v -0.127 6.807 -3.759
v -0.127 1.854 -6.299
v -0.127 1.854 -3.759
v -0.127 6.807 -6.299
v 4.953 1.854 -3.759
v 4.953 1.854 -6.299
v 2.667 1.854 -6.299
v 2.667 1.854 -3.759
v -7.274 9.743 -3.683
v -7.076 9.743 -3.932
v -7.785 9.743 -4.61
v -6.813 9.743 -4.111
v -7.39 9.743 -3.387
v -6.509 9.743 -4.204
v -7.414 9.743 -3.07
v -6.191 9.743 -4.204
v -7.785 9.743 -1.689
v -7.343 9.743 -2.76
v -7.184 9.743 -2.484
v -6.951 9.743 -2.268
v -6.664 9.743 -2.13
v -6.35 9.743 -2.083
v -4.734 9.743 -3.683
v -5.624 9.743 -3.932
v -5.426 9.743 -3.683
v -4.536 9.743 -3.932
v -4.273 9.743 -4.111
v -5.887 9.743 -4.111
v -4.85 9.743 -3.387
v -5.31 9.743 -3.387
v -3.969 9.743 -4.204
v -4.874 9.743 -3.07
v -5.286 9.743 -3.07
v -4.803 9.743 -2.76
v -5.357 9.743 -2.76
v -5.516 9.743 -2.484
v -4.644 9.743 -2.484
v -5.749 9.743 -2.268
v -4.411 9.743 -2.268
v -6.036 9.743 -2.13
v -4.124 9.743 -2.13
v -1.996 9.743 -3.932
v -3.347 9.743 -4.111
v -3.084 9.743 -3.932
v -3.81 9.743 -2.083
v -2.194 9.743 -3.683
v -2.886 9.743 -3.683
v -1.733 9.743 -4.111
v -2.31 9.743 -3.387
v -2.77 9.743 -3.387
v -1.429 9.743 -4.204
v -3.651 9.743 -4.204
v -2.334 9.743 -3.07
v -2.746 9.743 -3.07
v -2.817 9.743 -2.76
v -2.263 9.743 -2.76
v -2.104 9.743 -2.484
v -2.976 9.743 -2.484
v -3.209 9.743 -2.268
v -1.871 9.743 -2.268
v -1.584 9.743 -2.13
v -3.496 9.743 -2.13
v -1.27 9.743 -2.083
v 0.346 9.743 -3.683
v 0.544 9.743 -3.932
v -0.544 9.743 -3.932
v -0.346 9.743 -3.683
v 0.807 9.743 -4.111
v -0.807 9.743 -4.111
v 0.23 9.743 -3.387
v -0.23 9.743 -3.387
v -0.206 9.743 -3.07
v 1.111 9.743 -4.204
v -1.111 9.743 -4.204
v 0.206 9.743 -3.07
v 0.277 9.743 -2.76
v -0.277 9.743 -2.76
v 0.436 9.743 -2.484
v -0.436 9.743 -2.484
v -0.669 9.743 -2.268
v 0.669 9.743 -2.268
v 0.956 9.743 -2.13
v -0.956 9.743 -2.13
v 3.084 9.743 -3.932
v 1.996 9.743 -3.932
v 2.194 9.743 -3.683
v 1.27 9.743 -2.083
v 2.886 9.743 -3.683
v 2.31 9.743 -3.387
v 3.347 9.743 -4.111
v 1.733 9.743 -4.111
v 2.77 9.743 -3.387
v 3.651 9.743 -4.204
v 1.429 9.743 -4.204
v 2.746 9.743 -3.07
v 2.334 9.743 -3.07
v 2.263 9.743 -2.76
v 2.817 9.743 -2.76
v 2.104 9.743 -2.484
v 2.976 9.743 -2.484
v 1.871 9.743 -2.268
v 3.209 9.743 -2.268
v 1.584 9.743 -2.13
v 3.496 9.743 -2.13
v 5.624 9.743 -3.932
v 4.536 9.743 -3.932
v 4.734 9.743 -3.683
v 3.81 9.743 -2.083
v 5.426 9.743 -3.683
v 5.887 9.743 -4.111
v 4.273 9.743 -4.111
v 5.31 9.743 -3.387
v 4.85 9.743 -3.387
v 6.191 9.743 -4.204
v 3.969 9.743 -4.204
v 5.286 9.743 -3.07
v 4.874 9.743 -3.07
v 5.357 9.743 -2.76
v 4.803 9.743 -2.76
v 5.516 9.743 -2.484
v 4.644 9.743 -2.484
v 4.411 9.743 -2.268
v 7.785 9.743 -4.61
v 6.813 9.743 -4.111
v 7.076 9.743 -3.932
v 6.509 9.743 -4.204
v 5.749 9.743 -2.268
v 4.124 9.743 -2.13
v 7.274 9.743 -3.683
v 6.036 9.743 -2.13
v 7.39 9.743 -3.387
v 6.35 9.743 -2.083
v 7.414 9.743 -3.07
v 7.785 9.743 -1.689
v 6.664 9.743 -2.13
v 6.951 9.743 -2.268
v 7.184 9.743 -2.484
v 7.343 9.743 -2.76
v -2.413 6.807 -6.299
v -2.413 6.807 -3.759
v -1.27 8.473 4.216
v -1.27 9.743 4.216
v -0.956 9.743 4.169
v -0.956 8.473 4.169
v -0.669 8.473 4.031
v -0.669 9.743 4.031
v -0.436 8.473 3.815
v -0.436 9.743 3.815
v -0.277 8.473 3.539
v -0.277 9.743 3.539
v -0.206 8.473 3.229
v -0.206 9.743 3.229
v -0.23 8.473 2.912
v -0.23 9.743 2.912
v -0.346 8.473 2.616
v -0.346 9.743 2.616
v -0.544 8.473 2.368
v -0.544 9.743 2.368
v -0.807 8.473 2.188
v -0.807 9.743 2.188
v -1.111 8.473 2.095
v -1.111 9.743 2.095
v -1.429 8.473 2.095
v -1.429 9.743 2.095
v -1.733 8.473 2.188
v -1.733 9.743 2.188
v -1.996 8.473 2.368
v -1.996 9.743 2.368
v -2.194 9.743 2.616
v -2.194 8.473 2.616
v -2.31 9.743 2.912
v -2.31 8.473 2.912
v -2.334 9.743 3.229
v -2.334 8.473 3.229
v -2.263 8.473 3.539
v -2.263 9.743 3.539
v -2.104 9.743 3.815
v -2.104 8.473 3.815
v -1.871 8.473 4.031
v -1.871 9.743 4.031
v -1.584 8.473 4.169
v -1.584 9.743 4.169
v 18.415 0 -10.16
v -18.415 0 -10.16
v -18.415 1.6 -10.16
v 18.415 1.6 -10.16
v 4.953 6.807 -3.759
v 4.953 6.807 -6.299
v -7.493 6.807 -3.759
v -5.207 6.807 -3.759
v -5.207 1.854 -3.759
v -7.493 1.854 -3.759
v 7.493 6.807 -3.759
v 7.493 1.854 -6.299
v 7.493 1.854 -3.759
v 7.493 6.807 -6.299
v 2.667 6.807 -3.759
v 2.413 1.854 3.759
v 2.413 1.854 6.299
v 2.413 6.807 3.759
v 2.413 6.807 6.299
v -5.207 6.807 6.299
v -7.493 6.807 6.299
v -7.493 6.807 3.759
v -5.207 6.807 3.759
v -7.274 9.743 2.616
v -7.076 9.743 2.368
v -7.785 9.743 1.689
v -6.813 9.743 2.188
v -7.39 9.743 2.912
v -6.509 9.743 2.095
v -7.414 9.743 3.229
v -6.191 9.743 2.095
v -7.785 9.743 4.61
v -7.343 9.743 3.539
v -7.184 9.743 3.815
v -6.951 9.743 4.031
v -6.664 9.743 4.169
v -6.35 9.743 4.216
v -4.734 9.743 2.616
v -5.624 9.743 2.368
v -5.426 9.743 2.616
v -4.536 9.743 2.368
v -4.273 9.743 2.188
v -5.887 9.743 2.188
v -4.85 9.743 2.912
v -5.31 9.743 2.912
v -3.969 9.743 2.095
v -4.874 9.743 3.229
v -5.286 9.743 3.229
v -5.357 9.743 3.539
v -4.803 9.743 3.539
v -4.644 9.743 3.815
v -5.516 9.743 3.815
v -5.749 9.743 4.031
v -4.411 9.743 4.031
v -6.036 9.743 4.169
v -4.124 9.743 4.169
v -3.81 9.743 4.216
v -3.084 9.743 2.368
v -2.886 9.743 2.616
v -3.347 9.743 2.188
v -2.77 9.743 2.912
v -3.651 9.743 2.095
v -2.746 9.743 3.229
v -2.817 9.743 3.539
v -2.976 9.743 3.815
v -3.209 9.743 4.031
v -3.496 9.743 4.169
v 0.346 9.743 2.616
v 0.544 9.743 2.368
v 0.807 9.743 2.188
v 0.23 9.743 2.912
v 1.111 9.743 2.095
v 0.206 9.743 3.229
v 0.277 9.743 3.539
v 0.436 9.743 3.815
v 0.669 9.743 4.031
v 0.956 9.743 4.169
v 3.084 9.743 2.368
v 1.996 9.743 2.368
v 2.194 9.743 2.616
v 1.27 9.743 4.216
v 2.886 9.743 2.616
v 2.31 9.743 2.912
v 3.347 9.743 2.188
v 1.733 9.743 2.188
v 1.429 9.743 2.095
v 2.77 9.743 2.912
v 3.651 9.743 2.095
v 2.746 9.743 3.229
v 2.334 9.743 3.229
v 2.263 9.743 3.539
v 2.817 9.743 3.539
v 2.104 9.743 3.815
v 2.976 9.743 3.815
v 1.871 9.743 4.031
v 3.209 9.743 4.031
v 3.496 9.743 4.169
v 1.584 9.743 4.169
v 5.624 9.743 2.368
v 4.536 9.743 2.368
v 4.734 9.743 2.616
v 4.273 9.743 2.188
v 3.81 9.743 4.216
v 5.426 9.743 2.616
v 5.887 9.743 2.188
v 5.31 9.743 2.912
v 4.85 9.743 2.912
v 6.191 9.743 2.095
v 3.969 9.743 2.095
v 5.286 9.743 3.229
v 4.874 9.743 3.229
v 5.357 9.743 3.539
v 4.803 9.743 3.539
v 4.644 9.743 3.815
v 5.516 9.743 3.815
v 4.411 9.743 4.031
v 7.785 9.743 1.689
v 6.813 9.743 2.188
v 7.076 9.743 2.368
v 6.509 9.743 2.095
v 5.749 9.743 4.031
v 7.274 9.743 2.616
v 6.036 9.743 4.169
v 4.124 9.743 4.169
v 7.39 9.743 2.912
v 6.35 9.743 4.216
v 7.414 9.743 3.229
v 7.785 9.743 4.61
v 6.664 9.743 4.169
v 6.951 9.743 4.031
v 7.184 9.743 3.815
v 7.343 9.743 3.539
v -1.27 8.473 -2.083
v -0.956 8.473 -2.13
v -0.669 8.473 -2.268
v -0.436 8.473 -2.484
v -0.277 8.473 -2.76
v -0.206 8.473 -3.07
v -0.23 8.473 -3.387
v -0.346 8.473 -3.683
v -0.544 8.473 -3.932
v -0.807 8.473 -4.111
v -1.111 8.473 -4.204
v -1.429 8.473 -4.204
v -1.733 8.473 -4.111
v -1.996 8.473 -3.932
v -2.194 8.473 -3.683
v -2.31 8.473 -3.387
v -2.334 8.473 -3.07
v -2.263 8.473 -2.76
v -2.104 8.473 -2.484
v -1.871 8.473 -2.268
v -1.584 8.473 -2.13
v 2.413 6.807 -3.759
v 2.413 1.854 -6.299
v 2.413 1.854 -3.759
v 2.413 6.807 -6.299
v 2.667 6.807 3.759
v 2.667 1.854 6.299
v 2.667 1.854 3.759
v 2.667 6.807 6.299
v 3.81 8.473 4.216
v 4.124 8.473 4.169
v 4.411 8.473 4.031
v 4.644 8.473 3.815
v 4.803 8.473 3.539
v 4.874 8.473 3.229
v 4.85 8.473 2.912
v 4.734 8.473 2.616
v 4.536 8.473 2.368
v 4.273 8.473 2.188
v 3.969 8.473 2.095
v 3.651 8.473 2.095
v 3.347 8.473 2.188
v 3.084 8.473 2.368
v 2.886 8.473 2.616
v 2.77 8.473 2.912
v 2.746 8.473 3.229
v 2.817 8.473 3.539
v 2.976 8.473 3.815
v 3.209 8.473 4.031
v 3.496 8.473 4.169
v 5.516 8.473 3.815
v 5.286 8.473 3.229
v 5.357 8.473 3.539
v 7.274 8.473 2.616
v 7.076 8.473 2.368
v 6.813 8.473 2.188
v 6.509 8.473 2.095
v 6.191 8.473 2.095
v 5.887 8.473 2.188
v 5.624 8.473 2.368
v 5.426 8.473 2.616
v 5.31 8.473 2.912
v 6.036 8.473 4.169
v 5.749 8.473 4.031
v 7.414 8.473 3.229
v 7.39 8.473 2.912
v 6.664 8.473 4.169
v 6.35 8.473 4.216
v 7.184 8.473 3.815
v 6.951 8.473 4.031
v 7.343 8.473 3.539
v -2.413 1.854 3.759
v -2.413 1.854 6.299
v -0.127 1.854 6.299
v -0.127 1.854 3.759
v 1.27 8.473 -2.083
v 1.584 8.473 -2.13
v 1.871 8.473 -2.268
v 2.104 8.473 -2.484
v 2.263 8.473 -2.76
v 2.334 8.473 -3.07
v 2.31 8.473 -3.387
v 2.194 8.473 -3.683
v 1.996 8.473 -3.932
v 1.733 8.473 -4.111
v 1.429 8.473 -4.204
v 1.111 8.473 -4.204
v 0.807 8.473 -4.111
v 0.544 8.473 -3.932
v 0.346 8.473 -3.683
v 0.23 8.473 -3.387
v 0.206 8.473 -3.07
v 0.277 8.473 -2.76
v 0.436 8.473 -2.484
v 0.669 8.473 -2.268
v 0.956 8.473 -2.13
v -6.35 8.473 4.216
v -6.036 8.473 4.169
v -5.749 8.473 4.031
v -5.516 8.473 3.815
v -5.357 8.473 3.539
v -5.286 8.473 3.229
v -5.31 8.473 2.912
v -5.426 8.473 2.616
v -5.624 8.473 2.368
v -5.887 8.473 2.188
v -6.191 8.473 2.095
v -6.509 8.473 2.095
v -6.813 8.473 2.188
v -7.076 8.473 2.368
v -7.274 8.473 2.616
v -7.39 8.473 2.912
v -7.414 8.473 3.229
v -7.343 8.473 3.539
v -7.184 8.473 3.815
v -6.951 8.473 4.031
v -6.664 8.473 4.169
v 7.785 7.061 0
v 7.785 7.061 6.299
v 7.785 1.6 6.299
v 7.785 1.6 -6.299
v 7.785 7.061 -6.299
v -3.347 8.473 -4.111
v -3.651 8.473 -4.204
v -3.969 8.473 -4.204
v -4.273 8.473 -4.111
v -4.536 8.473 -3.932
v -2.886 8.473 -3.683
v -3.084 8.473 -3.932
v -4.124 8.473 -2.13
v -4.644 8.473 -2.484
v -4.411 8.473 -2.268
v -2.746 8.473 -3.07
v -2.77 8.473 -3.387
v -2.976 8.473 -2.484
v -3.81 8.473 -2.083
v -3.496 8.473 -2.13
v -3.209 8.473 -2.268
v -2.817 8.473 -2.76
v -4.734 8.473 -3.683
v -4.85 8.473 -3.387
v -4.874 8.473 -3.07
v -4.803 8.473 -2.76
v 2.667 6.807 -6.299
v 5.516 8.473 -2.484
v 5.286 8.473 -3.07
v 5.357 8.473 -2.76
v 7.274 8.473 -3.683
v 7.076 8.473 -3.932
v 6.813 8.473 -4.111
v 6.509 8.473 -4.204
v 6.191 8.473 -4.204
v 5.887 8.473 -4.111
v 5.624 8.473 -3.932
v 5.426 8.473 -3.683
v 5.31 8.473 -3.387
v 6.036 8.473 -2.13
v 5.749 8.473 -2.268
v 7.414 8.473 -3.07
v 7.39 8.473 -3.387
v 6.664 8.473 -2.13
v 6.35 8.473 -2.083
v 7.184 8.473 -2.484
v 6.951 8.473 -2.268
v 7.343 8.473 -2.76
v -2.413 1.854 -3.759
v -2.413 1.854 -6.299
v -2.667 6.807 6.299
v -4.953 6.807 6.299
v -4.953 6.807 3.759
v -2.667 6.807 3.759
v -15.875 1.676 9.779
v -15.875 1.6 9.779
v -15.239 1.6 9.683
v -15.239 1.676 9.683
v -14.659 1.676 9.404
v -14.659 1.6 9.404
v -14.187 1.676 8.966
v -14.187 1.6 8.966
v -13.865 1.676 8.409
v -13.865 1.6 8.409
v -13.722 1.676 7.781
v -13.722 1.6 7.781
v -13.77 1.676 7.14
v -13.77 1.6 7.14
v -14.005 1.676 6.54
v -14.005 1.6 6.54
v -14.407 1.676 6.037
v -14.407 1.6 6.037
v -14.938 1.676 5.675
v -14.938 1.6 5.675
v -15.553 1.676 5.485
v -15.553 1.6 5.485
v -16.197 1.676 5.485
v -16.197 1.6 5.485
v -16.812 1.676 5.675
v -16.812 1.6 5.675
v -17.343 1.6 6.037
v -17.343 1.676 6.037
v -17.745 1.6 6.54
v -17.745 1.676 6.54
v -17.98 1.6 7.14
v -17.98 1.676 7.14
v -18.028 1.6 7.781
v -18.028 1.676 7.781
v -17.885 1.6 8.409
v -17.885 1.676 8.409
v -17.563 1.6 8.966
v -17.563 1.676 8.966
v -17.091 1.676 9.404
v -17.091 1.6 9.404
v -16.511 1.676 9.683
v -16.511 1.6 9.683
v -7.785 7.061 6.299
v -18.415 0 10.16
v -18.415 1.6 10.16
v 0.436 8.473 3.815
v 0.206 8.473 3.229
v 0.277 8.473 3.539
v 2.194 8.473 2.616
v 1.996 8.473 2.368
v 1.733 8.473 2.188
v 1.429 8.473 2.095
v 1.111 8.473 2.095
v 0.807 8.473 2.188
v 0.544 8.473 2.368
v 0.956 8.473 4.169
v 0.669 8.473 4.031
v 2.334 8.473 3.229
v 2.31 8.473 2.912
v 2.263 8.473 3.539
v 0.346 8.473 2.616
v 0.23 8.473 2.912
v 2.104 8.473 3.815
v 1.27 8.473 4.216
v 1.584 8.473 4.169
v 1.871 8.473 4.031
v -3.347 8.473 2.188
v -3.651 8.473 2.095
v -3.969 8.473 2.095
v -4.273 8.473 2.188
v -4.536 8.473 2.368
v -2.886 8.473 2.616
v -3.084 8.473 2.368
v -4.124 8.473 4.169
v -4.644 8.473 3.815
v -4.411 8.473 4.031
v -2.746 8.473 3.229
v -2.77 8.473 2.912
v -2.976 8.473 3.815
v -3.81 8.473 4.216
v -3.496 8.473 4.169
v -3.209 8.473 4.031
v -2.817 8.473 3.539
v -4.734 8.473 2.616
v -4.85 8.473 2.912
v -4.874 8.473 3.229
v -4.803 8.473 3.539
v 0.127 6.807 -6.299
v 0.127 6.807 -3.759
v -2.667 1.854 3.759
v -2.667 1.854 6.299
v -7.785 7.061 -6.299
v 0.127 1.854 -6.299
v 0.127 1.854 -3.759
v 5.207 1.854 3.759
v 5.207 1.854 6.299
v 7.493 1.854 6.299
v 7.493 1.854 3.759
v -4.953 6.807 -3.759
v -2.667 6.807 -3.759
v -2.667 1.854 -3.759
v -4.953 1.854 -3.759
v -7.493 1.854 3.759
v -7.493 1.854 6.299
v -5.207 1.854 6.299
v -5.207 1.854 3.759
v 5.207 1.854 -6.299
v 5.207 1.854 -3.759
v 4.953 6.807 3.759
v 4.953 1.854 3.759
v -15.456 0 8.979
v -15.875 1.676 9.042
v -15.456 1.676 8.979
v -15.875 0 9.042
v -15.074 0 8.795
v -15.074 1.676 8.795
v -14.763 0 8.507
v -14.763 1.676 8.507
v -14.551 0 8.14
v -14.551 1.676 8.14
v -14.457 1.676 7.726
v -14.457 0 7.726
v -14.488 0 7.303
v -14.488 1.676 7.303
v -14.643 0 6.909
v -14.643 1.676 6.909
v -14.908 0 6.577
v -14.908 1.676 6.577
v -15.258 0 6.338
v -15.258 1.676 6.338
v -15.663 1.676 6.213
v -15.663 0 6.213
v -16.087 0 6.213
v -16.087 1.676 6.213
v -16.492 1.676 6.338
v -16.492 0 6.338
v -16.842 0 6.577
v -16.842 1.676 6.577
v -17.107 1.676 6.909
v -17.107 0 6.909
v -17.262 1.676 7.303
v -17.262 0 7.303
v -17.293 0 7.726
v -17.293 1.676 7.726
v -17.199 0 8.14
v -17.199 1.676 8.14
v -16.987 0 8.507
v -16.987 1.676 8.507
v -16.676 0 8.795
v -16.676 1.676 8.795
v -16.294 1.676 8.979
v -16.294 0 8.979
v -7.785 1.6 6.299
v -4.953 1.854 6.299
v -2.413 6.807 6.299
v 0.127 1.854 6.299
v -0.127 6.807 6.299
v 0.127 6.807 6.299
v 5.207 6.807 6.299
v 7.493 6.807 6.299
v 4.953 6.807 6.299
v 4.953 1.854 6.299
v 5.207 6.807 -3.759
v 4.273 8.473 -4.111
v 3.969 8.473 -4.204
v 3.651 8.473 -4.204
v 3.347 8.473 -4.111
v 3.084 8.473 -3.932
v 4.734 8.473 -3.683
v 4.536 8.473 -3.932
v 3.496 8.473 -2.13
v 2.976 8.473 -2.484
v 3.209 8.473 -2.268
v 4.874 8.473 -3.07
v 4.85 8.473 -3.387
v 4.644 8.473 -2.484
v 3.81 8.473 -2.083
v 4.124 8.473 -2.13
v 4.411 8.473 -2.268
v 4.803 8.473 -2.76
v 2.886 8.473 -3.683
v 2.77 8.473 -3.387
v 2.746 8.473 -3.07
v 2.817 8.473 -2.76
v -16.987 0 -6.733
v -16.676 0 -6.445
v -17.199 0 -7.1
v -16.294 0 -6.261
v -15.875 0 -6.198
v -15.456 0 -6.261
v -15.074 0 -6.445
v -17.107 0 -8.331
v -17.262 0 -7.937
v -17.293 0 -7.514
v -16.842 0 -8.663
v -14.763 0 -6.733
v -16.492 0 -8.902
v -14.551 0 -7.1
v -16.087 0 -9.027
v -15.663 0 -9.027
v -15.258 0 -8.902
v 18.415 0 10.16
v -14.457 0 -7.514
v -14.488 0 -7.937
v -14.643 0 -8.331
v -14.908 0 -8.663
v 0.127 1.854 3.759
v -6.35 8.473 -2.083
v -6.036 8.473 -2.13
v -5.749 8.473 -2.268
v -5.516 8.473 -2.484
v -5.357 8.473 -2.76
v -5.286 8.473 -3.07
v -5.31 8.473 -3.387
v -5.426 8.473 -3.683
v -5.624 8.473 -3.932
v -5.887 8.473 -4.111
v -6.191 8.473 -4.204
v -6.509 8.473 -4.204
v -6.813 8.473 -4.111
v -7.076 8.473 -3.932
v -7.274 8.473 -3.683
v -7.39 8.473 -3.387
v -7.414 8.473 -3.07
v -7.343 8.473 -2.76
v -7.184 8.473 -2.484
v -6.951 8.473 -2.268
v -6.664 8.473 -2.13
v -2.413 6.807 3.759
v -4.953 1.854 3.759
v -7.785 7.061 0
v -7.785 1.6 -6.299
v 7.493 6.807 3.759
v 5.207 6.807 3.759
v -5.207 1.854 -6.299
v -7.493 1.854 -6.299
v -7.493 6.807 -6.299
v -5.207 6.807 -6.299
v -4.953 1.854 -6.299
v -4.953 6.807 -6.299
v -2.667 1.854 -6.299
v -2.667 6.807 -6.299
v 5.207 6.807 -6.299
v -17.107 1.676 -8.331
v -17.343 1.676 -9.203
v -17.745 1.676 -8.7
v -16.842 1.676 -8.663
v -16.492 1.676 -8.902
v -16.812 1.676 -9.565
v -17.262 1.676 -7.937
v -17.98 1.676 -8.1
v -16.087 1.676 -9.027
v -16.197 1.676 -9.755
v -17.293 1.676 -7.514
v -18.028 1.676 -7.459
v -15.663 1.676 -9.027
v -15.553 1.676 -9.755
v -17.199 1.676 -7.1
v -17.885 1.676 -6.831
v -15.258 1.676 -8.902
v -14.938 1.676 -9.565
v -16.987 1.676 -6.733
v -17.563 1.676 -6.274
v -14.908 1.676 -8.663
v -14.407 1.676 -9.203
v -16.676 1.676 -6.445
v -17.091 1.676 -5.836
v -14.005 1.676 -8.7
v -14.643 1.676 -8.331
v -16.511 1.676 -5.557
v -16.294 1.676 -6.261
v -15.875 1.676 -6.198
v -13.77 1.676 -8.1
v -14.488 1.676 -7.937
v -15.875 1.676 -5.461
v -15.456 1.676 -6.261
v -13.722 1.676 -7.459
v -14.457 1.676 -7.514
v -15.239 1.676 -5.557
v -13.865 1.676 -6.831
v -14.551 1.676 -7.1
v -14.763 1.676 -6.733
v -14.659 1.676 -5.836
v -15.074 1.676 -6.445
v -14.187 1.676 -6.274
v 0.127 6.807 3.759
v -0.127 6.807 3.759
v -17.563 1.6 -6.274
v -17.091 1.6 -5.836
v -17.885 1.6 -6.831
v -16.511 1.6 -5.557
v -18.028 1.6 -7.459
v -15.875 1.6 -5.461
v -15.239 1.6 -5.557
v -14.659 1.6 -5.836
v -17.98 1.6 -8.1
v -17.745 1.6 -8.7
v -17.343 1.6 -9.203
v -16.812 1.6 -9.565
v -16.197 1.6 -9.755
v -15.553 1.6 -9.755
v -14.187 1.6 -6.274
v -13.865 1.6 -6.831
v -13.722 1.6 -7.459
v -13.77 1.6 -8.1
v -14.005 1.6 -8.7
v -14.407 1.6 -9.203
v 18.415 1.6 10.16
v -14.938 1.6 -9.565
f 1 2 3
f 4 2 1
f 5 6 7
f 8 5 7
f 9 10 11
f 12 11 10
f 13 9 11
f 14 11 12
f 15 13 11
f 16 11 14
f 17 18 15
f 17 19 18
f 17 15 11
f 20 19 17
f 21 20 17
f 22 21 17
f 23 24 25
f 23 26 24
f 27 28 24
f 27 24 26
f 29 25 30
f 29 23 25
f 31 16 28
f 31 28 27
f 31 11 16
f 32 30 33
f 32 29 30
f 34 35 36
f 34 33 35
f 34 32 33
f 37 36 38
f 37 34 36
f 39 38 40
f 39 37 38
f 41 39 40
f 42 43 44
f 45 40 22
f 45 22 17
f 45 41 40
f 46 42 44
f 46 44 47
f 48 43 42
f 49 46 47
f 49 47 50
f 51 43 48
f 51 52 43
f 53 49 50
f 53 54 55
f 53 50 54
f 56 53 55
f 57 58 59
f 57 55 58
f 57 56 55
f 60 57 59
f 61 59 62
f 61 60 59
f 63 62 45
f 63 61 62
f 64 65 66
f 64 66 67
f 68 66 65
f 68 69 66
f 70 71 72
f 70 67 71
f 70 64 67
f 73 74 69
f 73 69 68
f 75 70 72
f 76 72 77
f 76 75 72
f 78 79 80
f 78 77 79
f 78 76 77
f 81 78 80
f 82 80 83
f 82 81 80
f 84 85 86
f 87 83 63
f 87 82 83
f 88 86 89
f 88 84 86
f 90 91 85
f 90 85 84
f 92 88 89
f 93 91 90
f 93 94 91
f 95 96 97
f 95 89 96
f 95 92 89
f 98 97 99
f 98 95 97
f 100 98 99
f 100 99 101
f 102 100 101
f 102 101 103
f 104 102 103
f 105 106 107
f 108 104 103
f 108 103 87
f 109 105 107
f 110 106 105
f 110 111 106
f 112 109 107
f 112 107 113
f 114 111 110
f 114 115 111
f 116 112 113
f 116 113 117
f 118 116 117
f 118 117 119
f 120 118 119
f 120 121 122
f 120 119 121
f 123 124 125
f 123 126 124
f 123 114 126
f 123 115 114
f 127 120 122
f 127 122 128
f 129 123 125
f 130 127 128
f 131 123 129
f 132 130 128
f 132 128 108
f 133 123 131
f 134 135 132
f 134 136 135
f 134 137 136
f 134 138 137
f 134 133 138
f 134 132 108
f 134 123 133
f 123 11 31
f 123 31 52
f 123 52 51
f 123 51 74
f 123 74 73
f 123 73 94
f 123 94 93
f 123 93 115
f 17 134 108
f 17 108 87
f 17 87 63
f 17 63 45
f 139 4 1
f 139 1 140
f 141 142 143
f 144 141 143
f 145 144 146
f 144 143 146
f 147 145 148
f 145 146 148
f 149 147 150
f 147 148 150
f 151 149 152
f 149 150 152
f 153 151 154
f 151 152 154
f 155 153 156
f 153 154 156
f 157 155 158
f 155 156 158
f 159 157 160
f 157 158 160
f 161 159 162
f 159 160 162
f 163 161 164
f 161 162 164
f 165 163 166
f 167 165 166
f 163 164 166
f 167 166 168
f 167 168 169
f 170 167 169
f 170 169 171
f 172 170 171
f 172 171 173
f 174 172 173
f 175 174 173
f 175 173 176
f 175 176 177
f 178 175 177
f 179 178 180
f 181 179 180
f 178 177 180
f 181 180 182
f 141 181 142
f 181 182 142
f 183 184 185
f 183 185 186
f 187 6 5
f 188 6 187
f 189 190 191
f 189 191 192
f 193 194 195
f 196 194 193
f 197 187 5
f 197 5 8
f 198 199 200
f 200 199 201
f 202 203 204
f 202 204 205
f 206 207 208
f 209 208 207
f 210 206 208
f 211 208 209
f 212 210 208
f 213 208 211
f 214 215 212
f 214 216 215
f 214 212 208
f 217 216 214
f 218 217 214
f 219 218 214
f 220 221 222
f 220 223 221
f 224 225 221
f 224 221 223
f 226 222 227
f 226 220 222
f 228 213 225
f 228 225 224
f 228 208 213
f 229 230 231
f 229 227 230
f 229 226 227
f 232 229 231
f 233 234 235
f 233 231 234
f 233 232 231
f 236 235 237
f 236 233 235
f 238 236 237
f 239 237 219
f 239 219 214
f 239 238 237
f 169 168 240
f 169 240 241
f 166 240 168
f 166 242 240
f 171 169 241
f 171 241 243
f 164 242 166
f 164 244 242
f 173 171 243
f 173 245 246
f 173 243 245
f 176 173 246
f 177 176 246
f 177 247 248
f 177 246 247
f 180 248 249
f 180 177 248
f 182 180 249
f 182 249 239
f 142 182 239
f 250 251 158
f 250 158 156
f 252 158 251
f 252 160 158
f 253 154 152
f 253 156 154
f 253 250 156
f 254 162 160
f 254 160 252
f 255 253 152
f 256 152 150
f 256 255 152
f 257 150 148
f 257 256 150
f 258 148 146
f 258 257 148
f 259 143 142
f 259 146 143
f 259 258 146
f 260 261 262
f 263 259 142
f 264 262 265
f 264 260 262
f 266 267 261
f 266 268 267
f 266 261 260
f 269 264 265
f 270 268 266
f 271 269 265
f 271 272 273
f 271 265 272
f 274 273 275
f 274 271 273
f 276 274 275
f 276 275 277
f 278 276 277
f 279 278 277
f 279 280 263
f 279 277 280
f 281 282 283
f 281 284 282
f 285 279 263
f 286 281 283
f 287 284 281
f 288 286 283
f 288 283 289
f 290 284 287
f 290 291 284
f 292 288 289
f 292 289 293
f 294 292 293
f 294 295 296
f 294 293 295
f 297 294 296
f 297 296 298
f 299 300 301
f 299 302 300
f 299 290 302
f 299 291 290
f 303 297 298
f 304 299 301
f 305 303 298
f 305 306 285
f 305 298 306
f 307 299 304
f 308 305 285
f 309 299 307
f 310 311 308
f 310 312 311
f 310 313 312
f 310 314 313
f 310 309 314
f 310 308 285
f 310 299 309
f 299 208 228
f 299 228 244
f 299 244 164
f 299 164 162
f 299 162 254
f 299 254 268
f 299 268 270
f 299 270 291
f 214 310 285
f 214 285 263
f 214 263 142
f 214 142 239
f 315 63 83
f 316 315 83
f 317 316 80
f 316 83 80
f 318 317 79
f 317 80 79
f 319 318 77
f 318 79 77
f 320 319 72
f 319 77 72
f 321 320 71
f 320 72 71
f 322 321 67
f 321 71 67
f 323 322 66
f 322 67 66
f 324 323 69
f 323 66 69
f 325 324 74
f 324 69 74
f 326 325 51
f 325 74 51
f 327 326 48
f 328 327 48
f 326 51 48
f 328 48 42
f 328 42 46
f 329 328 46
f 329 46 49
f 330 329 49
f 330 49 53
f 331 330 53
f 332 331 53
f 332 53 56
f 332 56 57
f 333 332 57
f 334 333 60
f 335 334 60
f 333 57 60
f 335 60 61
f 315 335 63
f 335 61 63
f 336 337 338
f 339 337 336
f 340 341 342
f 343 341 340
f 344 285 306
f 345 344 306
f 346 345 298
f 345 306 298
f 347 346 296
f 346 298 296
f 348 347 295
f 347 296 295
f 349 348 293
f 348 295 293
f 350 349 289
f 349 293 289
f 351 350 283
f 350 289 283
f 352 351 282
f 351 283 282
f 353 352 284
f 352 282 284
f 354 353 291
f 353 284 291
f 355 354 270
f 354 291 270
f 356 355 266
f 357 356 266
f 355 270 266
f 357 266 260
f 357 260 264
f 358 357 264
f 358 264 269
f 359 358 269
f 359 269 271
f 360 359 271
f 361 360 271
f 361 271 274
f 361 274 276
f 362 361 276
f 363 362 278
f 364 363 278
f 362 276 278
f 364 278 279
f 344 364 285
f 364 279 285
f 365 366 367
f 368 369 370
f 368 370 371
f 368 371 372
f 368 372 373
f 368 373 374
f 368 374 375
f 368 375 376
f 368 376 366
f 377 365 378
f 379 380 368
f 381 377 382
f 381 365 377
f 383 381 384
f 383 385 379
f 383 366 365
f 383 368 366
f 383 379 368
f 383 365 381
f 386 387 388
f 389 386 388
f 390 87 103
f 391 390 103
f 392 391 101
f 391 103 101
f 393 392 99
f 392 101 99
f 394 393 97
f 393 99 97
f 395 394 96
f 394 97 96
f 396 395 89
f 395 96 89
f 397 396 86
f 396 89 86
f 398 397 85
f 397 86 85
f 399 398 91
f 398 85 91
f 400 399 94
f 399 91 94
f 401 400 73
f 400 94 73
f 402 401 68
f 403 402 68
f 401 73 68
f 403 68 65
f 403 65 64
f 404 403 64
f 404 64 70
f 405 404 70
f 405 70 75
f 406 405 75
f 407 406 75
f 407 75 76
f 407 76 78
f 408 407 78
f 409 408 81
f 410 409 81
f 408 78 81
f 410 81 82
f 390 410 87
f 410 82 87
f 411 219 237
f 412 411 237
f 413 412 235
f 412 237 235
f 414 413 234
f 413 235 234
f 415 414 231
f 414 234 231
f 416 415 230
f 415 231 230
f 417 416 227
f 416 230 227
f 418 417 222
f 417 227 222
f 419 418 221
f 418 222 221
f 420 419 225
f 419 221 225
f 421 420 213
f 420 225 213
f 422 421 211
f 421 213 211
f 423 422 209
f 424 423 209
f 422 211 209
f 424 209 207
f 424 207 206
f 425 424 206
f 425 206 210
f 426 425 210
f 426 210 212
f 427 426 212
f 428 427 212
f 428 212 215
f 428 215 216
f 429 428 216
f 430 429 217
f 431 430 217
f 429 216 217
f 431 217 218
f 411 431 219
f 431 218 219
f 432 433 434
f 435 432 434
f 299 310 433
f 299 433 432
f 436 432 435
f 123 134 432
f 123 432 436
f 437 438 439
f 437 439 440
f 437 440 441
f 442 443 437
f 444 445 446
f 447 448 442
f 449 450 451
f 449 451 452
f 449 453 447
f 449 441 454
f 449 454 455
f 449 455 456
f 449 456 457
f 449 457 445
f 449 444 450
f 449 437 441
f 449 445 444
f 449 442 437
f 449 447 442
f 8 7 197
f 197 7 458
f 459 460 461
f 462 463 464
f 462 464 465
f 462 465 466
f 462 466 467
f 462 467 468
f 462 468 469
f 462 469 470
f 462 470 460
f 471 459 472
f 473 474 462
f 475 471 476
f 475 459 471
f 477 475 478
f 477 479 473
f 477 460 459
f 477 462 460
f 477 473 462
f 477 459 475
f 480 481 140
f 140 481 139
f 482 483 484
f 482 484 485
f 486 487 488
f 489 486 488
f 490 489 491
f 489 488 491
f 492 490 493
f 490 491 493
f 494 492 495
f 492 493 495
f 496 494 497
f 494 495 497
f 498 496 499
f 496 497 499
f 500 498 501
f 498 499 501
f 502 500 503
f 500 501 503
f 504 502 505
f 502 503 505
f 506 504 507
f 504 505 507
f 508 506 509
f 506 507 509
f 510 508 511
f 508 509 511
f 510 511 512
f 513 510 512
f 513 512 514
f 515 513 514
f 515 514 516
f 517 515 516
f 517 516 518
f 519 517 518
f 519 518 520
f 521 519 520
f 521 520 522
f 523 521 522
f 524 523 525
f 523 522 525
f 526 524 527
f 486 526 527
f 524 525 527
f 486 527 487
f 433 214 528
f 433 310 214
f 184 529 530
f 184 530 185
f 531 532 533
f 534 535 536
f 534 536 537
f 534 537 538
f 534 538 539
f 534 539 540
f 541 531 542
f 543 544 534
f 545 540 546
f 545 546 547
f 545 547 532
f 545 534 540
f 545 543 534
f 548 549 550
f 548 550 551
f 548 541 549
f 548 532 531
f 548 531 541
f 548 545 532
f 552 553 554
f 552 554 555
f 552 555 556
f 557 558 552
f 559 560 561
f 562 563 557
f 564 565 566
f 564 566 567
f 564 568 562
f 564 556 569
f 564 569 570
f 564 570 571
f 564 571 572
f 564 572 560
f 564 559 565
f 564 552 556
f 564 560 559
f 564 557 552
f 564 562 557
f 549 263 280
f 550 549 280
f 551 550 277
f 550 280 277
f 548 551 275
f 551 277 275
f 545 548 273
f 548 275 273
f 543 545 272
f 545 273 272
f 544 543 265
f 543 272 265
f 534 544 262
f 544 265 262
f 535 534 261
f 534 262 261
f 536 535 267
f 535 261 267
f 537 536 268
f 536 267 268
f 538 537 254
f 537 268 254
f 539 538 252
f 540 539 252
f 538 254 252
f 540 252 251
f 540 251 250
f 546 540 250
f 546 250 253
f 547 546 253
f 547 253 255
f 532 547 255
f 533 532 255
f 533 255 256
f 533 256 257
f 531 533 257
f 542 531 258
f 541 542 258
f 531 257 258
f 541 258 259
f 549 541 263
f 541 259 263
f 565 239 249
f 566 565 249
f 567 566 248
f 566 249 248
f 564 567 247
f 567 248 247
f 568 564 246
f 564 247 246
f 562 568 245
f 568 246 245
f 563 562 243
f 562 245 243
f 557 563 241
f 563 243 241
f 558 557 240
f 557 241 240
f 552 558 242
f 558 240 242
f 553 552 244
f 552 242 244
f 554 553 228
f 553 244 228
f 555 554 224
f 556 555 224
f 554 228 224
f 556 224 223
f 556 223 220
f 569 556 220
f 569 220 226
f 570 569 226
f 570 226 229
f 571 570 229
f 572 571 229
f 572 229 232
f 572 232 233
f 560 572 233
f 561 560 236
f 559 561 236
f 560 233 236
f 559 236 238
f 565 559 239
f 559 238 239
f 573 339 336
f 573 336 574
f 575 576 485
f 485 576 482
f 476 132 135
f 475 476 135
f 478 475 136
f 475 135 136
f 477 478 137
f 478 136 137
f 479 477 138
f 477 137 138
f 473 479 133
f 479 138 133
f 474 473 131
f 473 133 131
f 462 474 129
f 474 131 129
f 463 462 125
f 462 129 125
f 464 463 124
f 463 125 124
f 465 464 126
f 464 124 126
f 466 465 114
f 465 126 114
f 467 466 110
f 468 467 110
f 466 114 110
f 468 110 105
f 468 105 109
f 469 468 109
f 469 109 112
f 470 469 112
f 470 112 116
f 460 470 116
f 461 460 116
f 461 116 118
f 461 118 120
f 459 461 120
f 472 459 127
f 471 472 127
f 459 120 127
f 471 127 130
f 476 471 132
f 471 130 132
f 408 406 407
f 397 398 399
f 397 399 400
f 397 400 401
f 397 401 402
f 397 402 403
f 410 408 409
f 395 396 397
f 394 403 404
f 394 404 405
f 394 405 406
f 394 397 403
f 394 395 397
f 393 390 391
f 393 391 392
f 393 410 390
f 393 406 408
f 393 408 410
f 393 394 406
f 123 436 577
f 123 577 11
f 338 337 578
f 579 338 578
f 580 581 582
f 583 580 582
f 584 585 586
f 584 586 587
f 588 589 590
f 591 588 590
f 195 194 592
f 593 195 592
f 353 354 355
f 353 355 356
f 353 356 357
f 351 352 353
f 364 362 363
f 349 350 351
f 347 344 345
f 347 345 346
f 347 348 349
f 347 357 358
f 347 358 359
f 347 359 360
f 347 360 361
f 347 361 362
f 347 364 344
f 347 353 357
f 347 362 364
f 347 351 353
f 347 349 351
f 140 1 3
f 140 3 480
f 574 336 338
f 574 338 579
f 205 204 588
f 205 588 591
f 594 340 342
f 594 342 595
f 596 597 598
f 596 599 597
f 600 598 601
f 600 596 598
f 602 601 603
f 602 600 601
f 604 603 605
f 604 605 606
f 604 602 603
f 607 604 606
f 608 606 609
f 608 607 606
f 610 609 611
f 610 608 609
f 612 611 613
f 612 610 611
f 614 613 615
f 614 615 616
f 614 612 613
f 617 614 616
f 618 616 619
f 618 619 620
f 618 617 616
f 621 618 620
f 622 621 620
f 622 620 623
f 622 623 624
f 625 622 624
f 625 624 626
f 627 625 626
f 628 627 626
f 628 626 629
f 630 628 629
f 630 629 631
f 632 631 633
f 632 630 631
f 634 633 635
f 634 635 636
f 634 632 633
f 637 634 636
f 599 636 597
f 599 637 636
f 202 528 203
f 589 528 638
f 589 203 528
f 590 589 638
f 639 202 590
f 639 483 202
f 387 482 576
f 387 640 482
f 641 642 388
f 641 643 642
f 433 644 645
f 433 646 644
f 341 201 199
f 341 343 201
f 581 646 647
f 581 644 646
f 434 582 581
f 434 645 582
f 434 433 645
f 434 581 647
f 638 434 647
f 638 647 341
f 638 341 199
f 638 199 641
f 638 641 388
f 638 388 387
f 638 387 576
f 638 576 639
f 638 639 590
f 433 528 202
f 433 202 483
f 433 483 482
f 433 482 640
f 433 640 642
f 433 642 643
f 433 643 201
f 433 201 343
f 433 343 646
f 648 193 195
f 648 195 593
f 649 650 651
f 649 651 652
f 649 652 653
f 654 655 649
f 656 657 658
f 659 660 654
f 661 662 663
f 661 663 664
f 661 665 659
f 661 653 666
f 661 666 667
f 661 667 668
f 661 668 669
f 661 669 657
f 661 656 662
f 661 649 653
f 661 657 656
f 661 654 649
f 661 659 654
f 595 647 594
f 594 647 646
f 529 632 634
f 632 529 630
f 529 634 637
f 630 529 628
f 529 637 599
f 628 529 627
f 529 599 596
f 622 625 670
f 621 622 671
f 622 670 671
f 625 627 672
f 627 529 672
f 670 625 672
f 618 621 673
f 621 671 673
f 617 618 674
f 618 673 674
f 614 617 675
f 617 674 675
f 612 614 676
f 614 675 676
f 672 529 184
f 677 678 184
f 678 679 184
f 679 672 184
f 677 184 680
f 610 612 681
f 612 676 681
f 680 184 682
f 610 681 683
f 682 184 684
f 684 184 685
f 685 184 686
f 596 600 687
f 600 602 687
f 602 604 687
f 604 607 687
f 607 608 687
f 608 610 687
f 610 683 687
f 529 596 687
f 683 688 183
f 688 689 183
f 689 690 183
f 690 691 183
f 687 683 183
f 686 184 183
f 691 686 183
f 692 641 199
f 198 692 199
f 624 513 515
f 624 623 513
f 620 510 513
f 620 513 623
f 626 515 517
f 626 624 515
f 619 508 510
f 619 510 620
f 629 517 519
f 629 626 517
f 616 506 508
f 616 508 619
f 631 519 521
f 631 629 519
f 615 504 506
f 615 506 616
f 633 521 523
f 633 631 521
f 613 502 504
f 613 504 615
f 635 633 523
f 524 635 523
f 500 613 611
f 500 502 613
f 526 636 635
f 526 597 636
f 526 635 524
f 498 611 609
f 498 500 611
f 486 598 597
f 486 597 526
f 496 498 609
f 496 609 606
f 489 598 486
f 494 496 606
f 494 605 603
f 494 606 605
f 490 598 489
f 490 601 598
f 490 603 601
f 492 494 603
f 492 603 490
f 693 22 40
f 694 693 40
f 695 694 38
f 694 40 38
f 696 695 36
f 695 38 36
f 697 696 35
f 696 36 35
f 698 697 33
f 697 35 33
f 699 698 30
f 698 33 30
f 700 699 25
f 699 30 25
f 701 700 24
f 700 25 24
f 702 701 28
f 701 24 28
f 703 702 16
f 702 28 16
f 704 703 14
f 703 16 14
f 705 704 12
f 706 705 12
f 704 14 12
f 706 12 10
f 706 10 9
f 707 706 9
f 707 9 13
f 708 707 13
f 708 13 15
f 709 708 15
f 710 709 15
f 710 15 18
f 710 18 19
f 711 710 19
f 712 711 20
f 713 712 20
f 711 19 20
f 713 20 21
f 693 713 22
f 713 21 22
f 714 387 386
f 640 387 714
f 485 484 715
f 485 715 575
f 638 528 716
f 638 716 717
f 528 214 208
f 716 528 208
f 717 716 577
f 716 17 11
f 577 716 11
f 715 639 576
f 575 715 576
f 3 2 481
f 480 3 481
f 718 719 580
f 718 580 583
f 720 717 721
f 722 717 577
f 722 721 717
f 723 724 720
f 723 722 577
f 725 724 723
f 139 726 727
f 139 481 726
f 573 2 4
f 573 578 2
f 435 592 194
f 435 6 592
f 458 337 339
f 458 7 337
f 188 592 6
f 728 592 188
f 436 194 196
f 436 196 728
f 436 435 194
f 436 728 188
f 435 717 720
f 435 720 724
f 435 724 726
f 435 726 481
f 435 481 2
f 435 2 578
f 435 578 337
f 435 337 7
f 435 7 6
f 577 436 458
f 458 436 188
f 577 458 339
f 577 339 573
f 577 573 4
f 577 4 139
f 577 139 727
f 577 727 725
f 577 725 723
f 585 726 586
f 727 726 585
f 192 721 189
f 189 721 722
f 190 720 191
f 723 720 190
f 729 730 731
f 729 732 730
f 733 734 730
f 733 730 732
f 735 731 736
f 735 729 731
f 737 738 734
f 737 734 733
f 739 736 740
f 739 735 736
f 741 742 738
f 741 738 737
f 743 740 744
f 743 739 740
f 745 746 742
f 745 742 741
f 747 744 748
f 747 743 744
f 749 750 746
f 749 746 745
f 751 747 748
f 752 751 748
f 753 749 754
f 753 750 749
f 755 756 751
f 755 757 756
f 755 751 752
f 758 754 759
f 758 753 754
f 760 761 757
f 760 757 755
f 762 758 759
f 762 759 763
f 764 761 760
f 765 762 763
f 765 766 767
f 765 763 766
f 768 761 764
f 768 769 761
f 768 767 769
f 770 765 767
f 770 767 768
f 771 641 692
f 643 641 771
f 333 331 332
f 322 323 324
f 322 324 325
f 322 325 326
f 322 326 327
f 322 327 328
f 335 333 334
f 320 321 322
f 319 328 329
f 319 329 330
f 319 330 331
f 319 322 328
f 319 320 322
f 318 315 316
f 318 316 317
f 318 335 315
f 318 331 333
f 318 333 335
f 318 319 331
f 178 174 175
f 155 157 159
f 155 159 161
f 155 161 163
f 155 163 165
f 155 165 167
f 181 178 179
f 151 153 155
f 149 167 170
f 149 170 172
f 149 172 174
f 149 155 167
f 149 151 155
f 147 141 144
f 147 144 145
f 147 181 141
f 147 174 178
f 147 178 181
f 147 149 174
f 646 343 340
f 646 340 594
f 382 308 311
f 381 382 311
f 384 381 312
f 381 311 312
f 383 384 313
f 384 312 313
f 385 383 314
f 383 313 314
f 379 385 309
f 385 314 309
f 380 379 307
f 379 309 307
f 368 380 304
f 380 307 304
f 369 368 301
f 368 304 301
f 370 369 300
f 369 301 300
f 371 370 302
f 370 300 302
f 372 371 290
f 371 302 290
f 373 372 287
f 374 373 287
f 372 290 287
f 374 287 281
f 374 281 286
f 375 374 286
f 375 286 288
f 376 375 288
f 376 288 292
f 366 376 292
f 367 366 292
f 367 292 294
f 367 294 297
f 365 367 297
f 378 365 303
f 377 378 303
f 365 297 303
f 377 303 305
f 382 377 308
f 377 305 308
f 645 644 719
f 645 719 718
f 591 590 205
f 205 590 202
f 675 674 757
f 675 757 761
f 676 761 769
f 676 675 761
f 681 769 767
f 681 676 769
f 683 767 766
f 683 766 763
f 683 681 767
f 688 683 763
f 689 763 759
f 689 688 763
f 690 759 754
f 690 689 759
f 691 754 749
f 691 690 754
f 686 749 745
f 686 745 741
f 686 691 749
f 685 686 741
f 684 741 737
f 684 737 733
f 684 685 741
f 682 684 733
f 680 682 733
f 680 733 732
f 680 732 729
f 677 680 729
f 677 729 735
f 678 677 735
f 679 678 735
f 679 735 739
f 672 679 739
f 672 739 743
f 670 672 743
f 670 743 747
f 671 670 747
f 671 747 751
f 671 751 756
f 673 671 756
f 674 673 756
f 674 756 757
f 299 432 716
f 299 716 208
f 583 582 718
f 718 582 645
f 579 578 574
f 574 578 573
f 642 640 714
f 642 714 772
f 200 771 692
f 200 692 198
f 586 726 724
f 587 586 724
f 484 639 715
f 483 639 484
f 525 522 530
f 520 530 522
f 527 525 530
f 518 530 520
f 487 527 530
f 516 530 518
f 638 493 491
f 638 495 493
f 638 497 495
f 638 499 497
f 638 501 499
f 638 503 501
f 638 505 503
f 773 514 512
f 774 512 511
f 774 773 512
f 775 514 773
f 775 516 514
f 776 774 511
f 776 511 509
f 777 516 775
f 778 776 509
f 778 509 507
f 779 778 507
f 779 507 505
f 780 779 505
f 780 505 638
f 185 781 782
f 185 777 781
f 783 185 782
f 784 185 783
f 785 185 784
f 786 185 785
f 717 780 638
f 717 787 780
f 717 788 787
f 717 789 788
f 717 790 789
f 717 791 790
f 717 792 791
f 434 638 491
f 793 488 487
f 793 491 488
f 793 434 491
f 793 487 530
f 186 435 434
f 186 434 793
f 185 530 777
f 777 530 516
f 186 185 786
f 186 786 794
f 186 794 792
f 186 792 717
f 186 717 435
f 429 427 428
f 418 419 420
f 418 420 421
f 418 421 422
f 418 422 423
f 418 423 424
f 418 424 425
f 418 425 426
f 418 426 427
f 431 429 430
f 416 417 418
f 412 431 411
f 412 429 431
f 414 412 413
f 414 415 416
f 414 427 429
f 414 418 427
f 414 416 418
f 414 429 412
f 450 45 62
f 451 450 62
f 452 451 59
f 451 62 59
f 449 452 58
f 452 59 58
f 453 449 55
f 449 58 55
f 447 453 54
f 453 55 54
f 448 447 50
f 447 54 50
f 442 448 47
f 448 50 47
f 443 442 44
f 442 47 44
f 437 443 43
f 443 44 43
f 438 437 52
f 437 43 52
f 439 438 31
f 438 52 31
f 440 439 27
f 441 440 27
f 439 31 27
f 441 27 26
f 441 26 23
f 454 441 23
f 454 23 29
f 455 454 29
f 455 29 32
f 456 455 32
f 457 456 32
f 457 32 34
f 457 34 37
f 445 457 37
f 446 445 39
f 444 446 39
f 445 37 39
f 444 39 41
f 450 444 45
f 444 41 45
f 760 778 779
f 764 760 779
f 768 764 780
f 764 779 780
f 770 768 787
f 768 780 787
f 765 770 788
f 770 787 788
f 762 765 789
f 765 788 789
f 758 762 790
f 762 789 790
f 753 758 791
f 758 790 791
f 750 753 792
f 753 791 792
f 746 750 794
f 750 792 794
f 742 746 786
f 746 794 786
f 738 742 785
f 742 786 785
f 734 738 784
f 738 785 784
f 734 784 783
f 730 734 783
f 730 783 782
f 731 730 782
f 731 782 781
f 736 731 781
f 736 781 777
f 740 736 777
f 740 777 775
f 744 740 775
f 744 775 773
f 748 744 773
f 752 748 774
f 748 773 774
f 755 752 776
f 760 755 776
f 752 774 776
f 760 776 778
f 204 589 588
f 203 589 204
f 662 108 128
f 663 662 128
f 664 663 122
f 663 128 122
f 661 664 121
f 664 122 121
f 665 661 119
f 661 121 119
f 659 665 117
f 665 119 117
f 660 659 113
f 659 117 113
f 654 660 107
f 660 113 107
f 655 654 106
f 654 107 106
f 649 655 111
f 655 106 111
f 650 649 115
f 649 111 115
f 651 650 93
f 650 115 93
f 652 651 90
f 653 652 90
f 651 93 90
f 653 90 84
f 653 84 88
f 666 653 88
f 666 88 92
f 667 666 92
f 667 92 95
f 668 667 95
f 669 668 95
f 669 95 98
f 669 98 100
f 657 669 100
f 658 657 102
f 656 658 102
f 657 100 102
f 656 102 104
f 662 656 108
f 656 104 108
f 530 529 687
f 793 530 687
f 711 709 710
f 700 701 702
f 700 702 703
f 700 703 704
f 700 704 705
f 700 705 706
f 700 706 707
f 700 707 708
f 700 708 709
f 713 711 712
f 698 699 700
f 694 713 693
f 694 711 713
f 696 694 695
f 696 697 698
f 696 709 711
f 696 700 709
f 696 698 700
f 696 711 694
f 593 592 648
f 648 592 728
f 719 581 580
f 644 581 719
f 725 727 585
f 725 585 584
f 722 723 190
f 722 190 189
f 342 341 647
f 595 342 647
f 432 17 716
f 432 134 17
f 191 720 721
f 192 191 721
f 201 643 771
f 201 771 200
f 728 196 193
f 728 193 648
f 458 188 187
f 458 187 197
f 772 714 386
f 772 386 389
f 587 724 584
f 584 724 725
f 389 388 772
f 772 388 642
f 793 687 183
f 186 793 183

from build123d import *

# Parameters (mm, degrees)
SKETCH1_W           = 36.83
SKETCH1_H           = 20.32
BOSS_EXTRUDE1_DEPTH = 1.6002
SKETCH5_R           = 1.4224
CUT_EXTRUDE3_DEPTH  = 22.092616363
BOSS_EXTRUDE2_DEPTH = 7.7851
BOSS_EXTRUDE3_DEPTH = 7.7851
SKETCH11_W          = 2.286
SKETCH11_H          = 4.953
CUT_EXTRUDE5_DEPTH  = 2.54
SKETCH12_W          = 2.286
SKETCH12_H          = 4.953
CUT_EXTRUDE6_DEPTH  = 2.54
SKETCH13_R          = 1.0668
CUT_EXTRUDE7_DEPTH  = 1.27
SKETCH17_R          = 1.0668
CUT_EXTRUDE9_DEPTH  = 1.27
SKETCH21_R          = 2.159
SKETCH21_R_2        = 1.4224
BOSS_EXTRUDE5_DEPTH = 0.0762


with BuildPart() as part:
    # Sketch1 → Boss-Extrude1 (new body)
    with BuildSketch(Plane(origin=(0, 0, 0), x_dir=(1, 0, 0), z_dir=(0, 1, 0))):
        Rectangle(SKETCH1_W, SKETCH1_H)
    extrude(amount=BOSS_EXTRUDE1_DEPTH)

    # Sketch5 → Cut-Extrude3 (cut, through all)
    with BuildSketch(Plane(origin=(0, 0, 0), x_dir=(1, 0, 0), z_dir=(0, 1, 0))):
        with Locations(Location((-15.875, 7.62, 0), (0, 0, 270))):
            Circle(SKETCH5_R)
        with Locations(Location((-15.875, -7.62, 0), (0, 0, 270))):
            Circle(SKETCH5_R)
    extrude(amount=CUT_EXTRUDE3_DEPTH, mode=Mode.SUBTRACT)

    # Sketch8 → Boss-Extrude2 (add, symmetric)
    with BuildSketch(Plane(origin=(0, 0, 0), x_dir=(0, 0, -1), z_dir=(1, 0, 0))):
        Polygon((0, 1.6002), (6.2992, 1.6002), (6.2992, 7.0612), (4.6101, 9.742765812), (1.6891, 9.742765812), (0, 7.0612), align=None)
    extrude(amount=BOSS_EXTRUDE2_DEPTH, both=True)

    # Sketch10 → Boss-Extrude3 (add, symmetric)
    with BuildSketch(Plane(origin=(0, 0, 0), x_dir=(0, 0, -1), z_dir=(1, 0, 0))):
        Polygon((-6.2992, 1.6002), (0, 1.6002), (0, 7.0612), (-1.6891, 9.742765812), (-4.6101, 9.742765812), (-6.2992, 7.0612), align=None)
    extrude(amount=BOSS_EXTRUDE3_DEPTH, both=True)

    # Sketch11 → Cut-Extrude5 (cut)
    with BuildSketch(Plane.XY.offset(6.2992)):
        with Locations((-1.27, 4.3307)):
            Rectangle(SKETCH11_W, SKETCH11_H)
        with Locations((-3.81, 4.3307)):
            Rectangle(SKETCH11_W, SKETCH11_H)
        with Locations((-6.35, 4.3307)):
            Rectangle(SKETCH11_W, SKETCH11_H)
        with Locations((1.27, 4.3307)):
            Rectangle(SKETCH11_W, SKETCH11_H)
        with Locations((3.81, 4.3307)):
            Rectangle(SKETCH11_W, SKETCH11_H)
        with Locations((6.35, 4.3307)):
            Rectangle(SKETCH11_W, SKETCH11_H)
    extrude(amount=-CUT_EXTRUDE5_DEPTH, mode=Mode.SUBTRACT)

    # Sketch12 → Cut-Extrude6 (cut)
    with BuildSketch(Plane(origin=(0, 0, -6.2992), x_dir=(-1, 0, 0), z_dir=(0, 0, -1))):
        with Locations((-1.27, 4.3307)):
            Rectangle(SKETCH12_W, SKETCH12_H)
        with Locations((-3.81, 4.3307)):
            Rectangle(SKETCH12_W, SKETCH12_H)
        with Locations((-6.35, 4.3307)):
            Rectangle(SKETCH12_W, SKETCH12_H)
        with Locations((1.27, 4.3307)):
            Rectangle(SKETCH12_W, SKETCH12_H)
        with Locations((3.81, 4.3307)):
            Rectangle(SKETCH12_W, SKETCH12_H)
        with Locations((6.35, 4.3307)):
            Rectangle(SKETCH12_W, SKETCH12_H)
    extrude(amount=-CUT_EXTRUDE6_DEPTH, mode=Mode.SUBTRACT)

    # Sketch13 → Cut-Extrude7 (cut)
    with BuildSketch(Plane(origin=(0, 9.742765812, 0), x_dir=(1, 0, 0), z_dir=(0, 1, 0))):
        with Locations(Location((-1.27, -3.1496, 0), (0, 0, 270))):
            Circle(SKETCH13_R)
        with Locations(Location((-3.81, -3.1496, 0), (0, 0, 270))):
            Circle(SKETCH13_R)
        with Locations(Location((-6.35, -3.1496, 0), (0, 0, 270))):
            Circle(SKETCH13_R)
        with Locations(Location((1.27, -3.1496, 0), (0, 0, 270))):
            Circle(SKETCH13_R)
        with Locations(Location((3.81, -3.1496, 0), (0, 0, 270))):
            Circle(SKETCH13_R)
        with Locations(Location((6.35, -3.1496, 0), (0, 0, 270))):
            Circle(SKETCH13_R)
    extrude(amount=-CUT_EXTRUDE7_DEPTH, mode=Mode.SUBTRACT)

    # Sketch17 → Cut-Extrude9 (cut)
    with BuildSketch(Plane(origin=(0, 9.742765812, 0), x_dir=(1, 0, 0), z_dir=(0, 1, 0))):
        with Locations(Location((-1.27, 3.1496, 0), (0, 0, 270))):
            Circle(SKETCH17_R)
        with Locations(Location((-3.81, 3.1496, 0), (0, 0, 270))):
            Circle(SKETCH17_R)
        with Locations(Location((-6.35, 3.1496, 0), (0, 0, 270))):
            Circle(SKETCH17_R)
        with Locations(Location((1.27, 3.1496, 0), (0, 0, 270))):
            Circle(SKETCH17_R)
        with Locations(Location((3.81, 3.1496, 0), (0, 0, 270))):
            Circle(SKETCH17_R)
        with Locations(Location((6.35, 3.1496, 0), (0, 0, 270))):
            Circle(SKETCH17_R)
    extrude(amount=-CUT_EXTRUDE9_DEPTH, mode=Mode.SUBTRACT)

    # Sketch21 → Boss-Extrude5 (add)
    # profile 1 of 2: a face of its own
    with BuildSketch(Plane(origin=(0, 1.6002, 0), x_dir=(1, 0, 0), z_dir=(0, 1, 0))):
        with Locations(Location((-15.875, -7.62, 0), (0, 0, 270))):
            Circle(SKETCH21_R)
        with Locations(Location((-15.875, -7.62, 0), (0, 0, 270))):
            Circle(SKETCH21_R_2, mode=Mode.SUBTRACT)
    # profile 2 of 2: a face of its own
    with BuildSketch(Plane(origin=(0, 1.6002, 0), x_dir=(1, 0, 0), z_dir=(0, 1, 0))):
        with Locations(Location((-15.875, 7.62, 0), (0, 0, 270))):
            Circle(SKETCH21_R)
        with Locations(Location((-15.875, 7.62, 0), (0, 0, 270))):
            Circle(SKETCH21_R_2, mode=Mode.SUBTRACT)
    extrude(amount=BOSS_EXTRUDE5_DEPTH)


solid = part.part
